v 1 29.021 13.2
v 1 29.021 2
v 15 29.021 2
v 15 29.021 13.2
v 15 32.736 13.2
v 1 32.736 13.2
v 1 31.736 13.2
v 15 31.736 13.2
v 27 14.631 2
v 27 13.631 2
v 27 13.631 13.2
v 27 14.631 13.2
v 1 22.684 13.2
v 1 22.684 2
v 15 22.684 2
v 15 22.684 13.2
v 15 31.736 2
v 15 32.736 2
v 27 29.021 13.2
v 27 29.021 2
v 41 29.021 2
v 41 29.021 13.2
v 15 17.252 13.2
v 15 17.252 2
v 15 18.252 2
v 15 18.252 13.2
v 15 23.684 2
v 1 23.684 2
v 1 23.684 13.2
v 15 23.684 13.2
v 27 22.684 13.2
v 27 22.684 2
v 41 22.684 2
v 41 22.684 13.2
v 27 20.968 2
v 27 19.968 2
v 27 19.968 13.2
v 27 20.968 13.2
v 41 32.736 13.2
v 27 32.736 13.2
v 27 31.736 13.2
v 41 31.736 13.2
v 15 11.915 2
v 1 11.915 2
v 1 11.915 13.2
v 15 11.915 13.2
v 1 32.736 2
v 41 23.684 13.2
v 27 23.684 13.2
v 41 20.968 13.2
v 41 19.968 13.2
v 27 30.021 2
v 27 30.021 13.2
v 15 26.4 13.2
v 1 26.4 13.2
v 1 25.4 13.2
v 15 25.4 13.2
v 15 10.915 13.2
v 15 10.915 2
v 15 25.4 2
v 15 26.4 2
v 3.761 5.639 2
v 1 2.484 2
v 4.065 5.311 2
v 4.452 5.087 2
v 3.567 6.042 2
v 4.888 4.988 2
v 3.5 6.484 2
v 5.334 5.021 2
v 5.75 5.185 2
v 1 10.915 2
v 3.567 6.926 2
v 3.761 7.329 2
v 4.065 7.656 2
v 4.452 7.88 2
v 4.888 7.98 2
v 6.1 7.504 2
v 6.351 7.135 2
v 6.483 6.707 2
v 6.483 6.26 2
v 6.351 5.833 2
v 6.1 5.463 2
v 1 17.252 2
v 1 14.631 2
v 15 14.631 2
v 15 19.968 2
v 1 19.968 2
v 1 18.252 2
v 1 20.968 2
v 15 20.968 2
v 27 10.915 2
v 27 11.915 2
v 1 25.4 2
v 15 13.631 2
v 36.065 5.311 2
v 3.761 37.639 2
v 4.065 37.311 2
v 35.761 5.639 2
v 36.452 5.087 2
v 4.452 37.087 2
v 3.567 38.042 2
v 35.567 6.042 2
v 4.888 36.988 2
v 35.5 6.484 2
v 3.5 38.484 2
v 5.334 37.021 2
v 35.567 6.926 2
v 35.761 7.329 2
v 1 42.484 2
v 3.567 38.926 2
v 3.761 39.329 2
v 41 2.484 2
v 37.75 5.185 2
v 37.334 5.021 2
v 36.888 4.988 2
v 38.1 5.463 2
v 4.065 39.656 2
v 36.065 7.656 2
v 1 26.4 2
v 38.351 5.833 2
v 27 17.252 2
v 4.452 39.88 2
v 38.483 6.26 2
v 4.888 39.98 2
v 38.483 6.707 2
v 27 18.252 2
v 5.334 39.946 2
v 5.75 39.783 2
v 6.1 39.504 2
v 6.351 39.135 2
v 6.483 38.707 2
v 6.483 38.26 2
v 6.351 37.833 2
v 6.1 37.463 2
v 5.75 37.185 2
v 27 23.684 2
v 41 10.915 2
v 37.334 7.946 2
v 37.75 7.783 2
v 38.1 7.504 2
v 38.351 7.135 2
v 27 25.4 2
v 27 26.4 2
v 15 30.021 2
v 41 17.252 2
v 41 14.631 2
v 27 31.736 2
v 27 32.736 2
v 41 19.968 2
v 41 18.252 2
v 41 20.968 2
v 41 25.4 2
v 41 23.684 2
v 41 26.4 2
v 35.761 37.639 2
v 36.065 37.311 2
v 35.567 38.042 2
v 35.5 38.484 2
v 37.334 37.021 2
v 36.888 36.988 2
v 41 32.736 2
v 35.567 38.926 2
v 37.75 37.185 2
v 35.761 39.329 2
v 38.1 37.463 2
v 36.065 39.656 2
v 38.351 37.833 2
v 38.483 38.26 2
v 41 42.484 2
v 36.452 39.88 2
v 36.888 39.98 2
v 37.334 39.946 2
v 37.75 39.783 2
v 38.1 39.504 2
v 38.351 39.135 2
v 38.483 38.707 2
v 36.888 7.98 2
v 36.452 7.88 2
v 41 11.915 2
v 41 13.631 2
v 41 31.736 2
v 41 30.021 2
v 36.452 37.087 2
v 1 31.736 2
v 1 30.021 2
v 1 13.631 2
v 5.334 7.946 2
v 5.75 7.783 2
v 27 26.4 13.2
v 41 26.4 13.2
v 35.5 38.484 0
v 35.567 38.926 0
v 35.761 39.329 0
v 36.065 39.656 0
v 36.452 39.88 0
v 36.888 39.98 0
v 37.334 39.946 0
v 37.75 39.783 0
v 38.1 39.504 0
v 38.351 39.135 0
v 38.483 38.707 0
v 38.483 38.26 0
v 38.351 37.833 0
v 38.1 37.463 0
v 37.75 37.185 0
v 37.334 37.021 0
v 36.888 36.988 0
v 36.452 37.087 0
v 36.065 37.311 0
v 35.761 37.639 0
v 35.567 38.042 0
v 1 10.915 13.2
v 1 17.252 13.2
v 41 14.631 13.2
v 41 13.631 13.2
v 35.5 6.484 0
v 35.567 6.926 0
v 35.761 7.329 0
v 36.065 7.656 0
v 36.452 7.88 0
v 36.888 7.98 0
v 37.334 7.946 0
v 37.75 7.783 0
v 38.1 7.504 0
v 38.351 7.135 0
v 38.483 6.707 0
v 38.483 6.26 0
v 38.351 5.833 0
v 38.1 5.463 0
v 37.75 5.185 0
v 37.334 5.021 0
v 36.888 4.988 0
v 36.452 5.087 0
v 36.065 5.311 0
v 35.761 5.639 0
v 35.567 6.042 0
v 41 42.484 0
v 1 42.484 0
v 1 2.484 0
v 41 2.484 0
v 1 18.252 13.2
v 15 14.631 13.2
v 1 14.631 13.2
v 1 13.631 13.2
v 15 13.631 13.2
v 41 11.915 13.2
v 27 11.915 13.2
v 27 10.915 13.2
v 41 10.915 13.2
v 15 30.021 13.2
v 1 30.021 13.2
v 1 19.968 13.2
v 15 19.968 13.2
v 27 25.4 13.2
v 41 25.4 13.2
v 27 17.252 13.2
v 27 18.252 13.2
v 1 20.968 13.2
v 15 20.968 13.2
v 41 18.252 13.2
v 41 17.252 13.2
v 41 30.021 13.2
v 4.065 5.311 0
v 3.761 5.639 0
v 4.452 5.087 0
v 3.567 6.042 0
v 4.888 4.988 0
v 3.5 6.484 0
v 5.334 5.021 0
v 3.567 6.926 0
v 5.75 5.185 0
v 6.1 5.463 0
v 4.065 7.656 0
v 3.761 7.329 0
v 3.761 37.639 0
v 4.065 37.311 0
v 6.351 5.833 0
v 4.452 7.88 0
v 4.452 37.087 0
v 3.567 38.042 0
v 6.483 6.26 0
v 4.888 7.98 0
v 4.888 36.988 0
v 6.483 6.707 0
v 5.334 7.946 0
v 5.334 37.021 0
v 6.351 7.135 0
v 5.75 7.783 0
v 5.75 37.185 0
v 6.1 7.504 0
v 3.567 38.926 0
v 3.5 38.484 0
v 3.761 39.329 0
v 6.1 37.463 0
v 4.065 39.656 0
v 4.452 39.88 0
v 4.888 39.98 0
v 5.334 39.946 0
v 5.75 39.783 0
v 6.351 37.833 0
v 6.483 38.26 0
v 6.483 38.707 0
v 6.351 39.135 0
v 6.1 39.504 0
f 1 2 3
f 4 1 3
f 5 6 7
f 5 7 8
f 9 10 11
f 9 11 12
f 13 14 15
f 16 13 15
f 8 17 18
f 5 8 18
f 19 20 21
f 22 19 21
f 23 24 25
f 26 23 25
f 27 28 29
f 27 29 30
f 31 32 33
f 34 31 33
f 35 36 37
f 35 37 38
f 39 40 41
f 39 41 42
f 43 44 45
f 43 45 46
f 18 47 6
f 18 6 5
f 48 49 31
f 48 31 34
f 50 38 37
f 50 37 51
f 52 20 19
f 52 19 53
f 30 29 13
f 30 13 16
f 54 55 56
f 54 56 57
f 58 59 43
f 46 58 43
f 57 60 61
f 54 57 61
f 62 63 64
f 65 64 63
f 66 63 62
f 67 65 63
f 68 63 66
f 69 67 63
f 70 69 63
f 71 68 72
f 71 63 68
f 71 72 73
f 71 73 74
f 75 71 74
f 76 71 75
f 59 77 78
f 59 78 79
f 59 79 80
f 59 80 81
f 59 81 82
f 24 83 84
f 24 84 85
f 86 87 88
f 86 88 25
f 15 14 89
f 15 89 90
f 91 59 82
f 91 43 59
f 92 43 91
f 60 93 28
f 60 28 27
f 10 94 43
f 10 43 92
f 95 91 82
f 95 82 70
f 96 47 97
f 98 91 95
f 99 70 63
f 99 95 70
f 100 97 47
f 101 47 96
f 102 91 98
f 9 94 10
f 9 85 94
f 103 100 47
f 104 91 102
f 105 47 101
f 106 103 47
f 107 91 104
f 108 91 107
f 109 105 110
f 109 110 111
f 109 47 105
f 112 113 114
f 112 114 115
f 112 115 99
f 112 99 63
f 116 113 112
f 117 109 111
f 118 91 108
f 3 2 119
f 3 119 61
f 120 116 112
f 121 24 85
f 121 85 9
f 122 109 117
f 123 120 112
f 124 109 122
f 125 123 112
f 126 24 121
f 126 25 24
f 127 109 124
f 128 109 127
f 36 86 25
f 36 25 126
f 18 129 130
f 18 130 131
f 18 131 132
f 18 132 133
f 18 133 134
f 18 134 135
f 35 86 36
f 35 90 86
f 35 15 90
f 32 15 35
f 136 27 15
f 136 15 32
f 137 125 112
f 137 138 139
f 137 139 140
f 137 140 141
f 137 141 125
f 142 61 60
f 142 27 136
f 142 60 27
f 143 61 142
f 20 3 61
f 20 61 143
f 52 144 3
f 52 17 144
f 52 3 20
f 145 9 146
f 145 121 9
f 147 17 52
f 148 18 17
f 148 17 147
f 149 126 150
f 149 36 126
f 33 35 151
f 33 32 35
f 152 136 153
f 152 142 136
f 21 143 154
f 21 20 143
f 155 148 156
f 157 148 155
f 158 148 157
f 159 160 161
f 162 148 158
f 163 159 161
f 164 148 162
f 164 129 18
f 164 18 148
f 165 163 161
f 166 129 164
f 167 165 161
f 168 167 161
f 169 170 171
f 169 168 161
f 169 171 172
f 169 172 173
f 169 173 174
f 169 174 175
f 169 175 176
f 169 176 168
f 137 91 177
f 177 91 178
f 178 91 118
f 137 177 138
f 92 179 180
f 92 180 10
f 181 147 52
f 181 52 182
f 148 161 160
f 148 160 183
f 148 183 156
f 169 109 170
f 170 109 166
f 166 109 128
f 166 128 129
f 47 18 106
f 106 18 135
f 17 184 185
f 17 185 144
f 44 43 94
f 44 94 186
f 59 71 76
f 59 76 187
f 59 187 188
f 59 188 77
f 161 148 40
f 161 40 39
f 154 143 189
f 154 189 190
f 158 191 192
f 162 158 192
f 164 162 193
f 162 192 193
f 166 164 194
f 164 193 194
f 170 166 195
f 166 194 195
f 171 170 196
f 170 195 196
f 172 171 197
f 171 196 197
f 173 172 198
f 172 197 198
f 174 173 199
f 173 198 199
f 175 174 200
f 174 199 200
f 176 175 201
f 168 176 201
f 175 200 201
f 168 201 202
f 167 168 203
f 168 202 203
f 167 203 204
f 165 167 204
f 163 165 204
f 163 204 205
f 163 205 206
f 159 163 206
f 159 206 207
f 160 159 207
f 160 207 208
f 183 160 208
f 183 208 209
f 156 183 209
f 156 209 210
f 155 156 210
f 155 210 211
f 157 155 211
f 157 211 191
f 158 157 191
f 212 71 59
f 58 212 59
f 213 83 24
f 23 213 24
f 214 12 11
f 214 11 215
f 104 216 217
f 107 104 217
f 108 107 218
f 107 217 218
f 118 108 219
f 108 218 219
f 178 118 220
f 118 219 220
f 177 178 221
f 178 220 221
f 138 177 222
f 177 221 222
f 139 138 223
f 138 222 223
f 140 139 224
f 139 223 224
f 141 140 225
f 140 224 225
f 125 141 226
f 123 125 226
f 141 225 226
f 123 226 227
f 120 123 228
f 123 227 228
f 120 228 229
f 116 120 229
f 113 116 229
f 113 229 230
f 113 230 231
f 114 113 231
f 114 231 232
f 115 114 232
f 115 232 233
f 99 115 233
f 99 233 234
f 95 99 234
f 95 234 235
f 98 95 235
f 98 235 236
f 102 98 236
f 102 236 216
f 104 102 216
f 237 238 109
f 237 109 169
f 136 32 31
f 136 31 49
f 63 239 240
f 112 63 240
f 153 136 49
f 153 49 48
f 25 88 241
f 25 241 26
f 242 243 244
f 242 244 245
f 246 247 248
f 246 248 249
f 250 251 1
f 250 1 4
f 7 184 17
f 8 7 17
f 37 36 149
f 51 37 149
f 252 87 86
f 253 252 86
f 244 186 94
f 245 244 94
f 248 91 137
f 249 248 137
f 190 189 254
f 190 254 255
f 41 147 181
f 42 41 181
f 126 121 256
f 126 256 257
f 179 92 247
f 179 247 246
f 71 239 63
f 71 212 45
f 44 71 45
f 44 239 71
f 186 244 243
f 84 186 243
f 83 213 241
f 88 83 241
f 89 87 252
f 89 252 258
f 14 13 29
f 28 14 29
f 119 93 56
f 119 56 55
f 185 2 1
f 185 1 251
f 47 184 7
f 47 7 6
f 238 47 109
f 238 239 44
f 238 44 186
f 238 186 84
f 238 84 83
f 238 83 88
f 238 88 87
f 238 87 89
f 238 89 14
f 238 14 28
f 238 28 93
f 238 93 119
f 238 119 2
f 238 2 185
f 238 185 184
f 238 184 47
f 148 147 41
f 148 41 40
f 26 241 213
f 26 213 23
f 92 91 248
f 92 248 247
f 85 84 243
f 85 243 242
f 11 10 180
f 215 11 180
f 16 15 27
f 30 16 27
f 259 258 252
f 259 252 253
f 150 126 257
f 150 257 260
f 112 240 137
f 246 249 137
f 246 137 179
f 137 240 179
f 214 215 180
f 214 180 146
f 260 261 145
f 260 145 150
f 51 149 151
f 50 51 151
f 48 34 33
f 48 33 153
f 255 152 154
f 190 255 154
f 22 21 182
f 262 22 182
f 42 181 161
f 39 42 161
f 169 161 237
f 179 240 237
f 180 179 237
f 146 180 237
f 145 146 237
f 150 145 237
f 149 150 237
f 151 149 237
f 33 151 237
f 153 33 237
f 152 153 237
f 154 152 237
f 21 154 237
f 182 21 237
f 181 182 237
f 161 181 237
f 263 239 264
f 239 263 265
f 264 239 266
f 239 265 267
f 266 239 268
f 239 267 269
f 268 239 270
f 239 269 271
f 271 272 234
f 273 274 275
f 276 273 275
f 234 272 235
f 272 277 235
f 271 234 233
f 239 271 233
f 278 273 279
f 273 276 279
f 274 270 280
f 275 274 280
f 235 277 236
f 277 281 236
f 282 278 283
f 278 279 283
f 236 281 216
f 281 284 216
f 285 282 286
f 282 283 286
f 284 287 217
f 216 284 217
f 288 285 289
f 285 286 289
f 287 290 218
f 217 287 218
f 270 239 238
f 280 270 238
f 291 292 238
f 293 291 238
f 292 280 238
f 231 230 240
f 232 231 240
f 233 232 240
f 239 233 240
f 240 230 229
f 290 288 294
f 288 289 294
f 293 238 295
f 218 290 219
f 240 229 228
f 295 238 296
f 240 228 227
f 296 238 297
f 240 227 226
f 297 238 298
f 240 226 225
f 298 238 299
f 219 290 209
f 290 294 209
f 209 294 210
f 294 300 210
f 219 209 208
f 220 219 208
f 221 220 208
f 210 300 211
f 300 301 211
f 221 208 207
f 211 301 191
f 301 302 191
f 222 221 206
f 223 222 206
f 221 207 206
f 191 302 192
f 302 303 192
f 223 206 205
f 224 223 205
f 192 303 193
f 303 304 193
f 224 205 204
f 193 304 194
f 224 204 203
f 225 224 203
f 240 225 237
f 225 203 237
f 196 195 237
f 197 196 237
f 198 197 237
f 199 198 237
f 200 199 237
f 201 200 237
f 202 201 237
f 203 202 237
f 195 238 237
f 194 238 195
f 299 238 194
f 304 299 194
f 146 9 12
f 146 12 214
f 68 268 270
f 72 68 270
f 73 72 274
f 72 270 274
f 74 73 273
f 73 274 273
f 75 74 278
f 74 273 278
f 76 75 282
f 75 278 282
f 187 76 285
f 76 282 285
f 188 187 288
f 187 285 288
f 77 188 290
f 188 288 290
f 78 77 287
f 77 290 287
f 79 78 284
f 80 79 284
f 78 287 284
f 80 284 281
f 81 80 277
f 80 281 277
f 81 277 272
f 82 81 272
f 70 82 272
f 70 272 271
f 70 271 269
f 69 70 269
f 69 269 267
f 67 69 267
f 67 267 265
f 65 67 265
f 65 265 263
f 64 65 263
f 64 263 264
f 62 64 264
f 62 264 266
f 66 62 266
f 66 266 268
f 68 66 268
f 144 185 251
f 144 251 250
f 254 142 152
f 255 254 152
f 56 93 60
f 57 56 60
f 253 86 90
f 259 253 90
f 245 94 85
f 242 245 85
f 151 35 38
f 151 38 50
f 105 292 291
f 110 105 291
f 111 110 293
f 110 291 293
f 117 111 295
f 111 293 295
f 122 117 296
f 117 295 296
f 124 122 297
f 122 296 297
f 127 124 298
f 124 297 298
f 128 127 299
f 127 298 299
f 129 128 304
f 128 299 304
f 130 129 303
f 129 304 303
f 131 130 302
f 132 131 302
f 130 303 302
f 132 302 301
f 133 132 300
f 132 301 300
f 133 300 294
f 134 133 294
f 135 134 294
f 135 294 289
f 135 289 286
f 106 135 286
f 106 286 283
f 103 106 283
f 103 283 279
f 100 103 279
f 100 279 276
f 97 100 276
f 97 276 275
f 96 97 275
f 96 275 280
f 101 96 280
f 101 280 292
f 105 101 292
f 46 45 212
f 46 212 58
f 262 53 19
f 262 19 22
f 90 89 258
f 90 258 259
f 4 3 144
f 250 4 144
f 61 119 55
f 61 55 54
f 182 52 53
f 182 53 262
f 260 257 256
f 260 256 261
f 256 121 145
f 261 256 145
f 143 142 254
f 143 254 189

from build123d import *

# Parameters (mm, degrees)
SKETCH1_W            = 40
SKETCH1_H            = 40
BOSS_EXTRUDE1_DEPTH  = 2
EXTRUDE_THIN1_START  = 2
SKETCH1_3_W          = 14
SKETCH1_3_H          = 1
EXTRUDE_THIN1_DEPTH  = 11.2
SKETCH3_R            = 1.5
CUT_EXTRUDE1_DEPTH   = 13.2
LPATTERN1_COUNT      = 2
LPATTERN1_PITCH      = 32
LPATTERN1_COUNT_DIR2 = 2
LPATTERN1_PITCH_DIR2 = 32


with BuildPart() as part:
    # Sketch1 → Boss-Extrude1 (new body)
    with BuildSketch(Plane.XY):
        with Locations((21, 22.483732861)):
            Rectangle(SKETCH1_W, SKETCH1_H)
    extrude(amount=BOSS_EXTRUDE1_DEPTH)

    # Sketch1<3> → Extrude-Thin1 (add)
    with BuildSketch(Plane.XY.offset(EXTRUDE_THIN1_START)):
        with Locations((34, 11.415311808)):
            Rectangle(SKETCH1_3_W, SKETCH1_3_H)
        with Locations((34, 14.131101282)):
            Rectangle(SKETCH1_3_W, SKETCH1_3_H)
        with Locations((34, 17.752153914)):
            Rectangle(SKETCH1_3_W, SKETCH1_3_H)
        with Locations((34, 20.467943387)):
            Rectangle(SKETCH1_3_W, SKETCH1_3_H)
        with Locations((34, 23.183732861)):
            Rectangle(SKETCH1_3_W, SKETCH1_3_H)
        with Locations((34, 25.899522335)):
            Rectangle(SKETCH1_3_W, SKETCH1_3_H)
        with Locations((34, 29.520574966)):
            Rectangle(SKETCH1_3_W, SKETCH1_3_H)
        with Locations((34, 32.23636444)):
            Rectangle(SKETCH1_3_W, SKETCH1_3_H)
        with Locations((8, 11.415311808)):
            Rectangle(SKETCH1_3_W, SKETCH1_3_H)
        with Locations((8, 14.131101282)):
            Rectangle(SKETCH1_3_W, SKETCH1_3_H)
        with Locations((8, 17.752153914)):
            Rectangle(SKETCH1_3_W, SKETCH1_3_H)
        with Locations((8, 20.467943387)):
            Rectangle(SKETCH1_3_W, SKETCH1_3_H)
        with Locations((8, 23.183732861)):
            Rectangle(SKETCH1_3_W, SKETCH1_3_H)
        with Locations((8, 25.899522335)):
            Rectangle(SKETCH1_3_W, SKETCH1_3_H)
        with Locations((8, 29.520574966)):
            Rectangle(SKETCH1_3_W, SKETCH1_3_H)
        with Locations((8, 32.23636444)):
            Rectangle(SKETCH1_3_W, SKETCH1_3_H)
    extrude(amount=EXTRUDE_THIN1_DEPTH)

    # Sketch3 → Cut-Extrude1 (cut)
    with BuildSketch(Plane(origin=(0, 0, 0), x_dir=(-1, 0, 0), z_dir=(0, 0, -1))):
        with Locations((-37, 6.483732861)):
            Circle(SKETCH3_R)
    cut_extrude1 = extrude(amount=-CUT_EXTRUDE1_DEPTH, mode=Mode.SUBTRACT)

    # LPattern1: Cut-Extrude1 2 × 2
    with Locations(*[(-i * LPATTERN1_PITCH, j * LPATTERN1_PITCH_DIR2, 0) for i in range(LPATTERN1_COUNT) for j in range(LPATTERN1_COUNT_DIR2) if (i, j) != (0, 0)]):
        add(cut_extrude1, mode=Mode.SUBTRACT)


solid = part.part
